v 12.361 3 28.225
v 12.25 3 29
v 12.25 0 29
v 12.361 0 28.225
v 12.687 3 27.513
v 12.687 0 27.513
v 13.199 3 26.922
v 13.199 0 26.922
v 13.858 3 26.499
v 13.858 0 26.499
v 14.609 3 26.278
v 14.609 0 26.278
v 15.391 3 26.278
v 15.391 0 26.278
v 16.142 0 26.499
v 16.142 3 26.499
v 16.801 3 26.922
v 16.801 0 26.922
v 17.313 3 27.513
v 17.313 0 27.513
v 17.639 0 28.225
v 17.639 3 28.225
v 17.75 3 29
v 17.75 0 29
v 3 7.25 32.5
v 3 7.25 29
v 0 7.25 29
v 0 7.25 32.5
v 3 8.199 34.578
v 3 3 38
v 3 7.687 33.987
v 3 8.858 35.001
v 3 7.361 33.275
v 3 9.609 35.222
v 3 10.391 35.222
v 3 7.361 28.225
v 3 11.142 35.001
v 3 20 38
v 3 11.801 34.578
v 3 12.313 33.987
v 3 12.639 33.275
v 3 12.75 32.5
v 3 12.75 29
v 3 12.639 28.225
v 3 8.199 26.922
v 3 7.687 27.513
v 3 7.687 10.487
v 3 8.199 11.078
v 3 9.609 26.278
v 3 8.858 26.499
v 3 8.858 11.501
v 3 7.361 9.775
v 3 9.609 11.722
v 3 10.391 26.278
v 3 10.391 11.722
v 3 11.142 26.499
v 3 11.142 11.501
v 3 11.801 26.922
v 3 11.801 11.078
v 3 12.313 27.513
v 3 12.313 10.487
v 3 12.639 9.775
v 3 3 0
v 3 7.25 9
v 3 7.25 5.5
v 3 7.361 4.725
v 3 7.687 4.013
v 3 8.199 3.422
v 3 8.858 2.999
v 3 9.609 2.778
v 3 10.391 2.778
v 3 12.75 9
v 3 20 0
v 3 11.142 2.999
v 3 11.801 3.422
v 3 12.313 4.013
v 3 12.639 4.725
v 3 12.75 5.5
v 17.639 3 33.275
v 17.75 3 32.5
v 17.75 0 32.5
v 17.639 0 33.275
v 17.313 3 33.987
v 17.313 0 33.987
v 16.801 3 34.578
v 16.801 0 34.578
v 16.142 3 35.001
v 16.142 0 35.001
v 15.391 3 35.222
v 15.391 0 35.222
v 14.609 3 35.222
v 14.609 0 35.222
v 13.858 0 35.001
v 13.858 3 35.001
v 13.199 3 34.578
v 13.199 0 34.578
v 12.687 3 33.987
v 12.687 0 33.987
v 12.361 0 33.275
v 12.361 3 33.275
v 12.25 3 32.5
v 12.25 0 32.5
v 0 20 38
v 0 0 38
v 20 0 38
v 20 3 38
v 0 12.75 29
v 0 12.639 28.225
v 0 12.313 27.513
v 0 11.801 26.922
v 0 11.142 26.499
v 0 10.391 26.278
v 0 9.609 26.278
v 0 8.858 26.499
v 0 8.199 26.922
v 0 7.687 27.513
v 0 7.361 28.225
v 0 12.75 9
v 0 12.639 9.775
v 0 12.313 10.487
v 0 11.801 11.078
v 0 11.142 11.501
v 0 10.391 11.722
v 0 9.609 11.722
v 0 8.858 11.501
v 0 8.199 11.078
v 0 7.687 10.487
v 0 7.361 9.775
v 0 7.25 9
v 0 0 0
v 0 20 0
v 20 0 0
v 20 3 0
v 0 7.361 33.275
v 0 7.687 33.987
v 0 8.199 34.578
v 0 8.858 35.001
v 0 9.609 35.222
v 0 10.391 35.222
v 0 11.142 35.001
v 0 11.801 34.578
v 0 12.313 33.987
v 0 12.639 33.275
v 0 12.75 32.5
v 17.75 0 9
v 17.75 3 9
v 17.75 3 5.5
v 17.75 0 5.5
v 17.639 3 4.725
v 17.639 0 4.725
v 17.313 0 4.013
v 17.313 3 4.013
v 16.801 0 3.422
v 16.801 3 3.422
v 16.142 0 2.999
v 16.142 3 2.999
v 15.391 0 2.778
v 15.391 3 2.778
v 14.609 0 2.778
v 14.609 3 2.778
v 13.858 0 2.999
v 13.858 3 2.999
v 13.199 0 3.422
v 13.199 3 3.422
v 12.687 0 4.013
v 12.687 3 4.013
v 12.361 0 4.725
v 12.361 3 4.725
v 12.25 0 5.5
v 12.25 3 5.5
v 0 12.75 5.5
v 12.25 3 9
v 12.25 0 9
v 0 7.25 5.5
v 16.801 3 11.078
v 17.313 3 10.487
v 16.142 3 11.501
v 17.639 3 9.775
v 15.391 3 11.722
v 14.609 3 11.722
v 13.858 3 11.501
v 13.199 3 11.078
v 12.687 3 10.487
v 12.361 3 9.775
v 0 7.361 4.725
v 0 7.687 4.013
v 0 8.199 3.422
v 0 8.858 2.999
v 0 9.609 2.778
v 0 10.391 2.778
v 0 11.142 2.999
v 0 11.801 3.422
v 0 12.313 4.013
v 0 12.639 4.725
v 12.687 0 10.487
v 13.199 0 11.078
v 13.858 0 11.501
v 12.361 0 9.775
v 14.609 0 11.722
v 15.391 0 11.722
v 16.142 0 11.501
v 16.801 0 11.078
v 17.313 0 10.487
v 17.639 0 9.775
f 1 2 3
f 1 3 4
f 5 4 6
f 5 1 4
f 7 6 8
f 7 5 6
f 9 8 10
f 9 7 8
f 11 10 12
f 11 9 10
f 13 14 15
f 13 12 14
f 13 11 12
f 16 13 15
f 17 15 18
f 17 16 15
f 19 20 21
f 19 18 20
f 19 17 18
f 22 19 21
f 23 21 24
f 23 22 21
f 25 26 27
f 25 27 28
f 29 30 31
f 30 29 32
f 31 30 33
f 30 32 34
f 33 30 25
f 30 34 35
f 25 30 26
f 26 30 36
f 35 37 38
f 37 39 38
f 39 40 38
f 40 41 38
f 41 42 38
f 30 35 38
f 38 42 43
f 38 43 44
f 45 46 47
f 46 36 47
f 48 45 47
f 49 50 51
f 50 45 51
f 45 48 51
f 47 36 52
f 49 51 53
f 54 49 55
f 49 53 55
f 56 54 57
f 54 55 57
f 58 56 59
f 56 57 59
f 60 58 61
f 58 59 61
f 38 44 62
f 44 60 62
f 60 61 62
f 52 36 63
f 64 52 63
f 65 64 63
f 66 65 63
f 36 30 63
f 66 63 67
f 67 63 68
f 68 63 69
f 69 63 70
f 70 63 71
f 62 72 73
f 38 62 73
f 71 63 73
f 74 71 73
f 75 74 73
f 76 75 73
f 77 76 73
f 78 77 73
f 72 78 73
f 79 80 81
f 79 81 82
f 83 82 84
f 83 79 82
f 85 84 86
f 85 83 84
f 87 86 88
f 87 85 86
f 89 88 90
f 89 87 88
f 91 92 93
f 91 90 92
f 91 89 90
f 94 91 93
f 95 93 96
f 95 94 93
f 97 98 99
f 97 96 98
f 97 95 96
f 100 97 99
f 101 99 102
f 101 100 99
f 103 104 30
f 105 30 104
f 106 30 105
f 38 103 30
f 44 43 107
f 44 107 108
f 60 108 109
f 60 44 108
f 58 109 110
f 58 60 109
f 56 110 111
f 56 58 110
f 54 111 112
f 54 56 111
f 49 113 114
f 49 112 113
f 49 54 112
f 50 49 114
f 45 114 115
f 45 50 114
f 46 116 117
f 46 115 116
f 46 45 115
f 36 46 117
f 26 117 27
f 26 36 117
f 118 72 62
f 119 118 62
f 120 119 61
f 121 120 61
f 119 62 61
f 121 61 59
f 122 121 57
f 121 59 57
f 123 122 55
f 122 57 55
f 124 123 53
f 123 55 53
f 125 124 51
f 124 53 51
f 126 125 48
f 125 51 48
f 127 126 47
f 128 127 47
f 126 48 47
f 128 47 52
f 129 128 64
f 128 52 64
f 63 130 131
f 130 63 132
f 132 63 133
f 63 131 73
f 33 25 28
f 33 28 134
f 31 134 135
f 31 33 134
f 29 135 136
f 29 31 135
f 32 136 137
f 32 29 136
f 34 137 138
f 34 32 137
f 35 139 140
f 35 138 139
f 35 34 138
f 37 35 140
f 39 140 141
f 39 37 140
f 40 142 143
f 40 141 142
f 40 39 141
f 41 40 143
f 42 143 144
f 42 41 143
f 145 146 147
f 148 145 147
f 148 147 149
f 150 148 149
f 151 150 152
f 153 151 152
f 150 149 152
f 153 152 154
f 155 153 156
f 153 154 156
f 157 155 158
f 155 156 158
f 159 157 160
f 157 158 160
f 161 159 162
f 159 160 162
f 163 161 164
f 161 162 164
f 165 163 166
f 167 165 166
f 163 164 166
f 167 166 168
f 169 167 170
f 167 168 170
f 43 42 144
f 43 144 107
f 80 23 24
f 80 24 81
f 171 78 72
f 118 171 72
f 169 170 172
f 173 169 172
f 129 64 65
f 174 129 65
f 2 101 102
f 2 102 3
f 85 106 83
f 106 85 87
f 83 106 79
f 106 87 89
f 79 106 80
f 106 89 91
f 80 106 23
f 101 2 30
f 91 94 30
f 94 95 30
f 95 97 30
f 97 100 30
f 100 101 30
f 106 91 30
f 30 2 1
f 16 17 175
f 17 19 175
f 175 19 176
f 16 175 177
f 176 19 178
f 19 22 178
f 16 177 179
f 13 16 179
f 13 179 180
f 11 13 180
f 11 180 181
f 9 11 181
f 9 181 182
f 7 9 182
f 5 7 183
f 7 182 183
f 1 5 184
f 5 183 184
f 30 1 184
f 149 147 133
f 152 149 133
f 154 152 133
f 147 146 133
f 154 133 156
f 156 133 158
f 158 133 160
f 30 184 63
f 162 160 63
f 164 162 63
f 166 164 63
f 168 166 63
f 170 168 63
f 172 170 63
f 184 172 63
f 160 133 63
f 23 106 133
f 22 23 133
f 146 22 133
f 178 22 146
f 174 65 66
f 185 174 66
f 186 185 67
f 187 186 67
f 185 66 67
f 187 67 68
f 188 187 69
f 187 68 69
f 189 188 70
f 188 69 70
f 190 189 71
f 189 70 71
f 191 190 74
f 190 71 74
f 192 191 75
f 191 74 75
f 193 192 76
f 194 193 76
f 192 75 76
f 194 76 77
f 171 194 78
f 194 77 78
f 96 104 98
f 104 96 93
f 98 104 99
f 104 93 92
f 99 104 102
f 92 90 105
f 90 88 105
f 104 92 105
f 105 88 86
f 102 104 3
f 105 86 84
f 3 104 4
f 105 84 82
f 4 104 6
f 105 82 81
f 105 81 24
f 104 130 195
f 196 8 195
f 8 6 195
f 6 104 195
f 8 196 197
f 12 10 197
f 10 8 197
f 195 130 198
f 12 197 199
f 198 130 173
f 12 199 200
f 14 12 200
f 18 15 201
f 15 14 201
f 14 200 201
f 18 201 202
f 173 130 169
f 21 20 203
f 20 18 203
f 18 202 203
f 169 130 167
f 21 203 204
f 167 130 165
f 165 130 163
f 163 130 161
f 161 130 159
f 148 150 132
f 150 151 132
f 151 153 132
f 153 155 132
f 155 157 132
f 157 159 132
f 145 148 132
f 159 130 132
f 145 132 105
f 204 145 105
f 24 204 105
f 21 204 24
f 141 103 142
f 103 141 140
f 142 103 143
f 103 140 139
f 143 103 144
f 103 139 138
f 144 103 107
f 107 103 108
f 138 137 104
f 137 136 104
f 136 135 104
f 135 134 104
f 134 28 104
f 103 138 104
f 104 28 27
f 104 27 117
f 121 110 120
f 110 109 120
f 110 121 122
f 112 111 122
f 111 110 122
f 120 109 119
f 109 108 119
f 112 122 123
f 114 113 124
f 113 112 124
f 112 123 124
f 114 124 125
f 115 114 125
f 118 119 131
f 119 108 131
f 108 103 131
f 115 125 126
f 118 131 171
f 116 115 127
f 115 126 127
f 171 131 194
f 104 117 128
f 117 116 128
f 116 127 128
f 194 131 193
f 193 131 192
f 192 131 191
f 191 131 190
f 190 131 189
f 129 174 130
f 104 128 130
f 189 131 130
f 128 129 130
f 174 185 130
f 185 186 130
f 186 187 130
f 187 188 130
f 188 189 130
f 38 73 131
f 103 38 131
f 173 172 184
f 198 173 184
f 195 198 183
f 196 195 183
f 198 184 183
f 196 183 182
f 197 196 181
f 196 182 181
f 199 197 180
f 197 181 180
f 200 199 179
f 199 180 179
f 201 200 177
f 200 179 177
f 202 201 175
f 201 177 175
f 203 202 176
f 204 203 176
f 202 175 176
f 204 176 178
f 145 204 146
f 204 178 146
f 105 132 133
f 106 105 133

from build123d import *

# Parameters (mm, degrees)
EXTRUDE_THIN1_DEPTH = 38
CUT_EXTRUDE1_DEPTH  = 4
CUT_EXTRUDE2_DEPTH  = 4


with BuildPart() as part:
    # Sketch1 → Extrude-Thin1 (new body)
    with BuildSketch(Plane.XY):
        Polygon((0, 20), (0, 0), (20, 0), (20, 3), (3, 3), (3, 20), align=None)
    extrude(amount=EXTRUDE_THIN1_DEPTH)

    # Sketch2 → Cut-Extrude1 (cut, through all)
    with BuildSketch(Plane(origin=(3, 0, 0), x_dir=(0, 0, -1), z_dir=(1, 0, 0))):
        with BuildLine():
            Line((-29, 7.25), (-32.5, 7.25))
            ThreePointArc((-32.5, 7.25), (-35.25, 10), (-32.5, 12.75))
            Line((-32.5, 12.75), (-29, 12.75))
            ThreePointArc((-29, 12.75), (-26.25, 10), (-29, 7.25))
        make_face()
        with BuildLine():
            Line((-9, 7.25), (-5.5, 7.25))
            ThreePointArc((-5.5, 7.25), (-2.75, 10), (-5.5, 12.75))
            Line((-5.5, 12.75), (-9, 12.75))
            ThreePointArc((-9, 12.75), (-11.75, 10), (-9, 7.25))
        make_face()
    extrude(amount=-CUT_EXTRUDE1_DEPTH, mode=Mode.SUBTRACT)

    # Sketch3 → Cut-Extrude2 (cut, through all)
    with BuildSketch(Plane(origin=(0, 3, 0), x_dir=(1, 0, 0), z_dir=(0, 1, 0))):
        with BuildLine():
            Line((12.25, -32.5), (12.25, -29))
            ThreePointArc((12.25, -29), (15, -26.25), (17.75, -29))
            Line((17.75, -29), (17.75, -32.5))
            ThreePointArc((17.75, -32.5), (15, -35.25), (12.25, -32.5))
        make_face()
        with BuildLine():
            Line((12.25, -5.5), (12.25, -9))
            ThreePointArc((12.25, -9), (15, -11.75), (17.75, -9))
            Line((17.75, -9), (17.75, -5.5))
            ThreePointArc((17.75, -5.5), (15, -2.75), (12.25, -5.5))
        make_face()
    extrude(amount=-CUT_EXTRUDE2_DEPTH, mode=Mode.SUBTRACT)


solid = part.part
